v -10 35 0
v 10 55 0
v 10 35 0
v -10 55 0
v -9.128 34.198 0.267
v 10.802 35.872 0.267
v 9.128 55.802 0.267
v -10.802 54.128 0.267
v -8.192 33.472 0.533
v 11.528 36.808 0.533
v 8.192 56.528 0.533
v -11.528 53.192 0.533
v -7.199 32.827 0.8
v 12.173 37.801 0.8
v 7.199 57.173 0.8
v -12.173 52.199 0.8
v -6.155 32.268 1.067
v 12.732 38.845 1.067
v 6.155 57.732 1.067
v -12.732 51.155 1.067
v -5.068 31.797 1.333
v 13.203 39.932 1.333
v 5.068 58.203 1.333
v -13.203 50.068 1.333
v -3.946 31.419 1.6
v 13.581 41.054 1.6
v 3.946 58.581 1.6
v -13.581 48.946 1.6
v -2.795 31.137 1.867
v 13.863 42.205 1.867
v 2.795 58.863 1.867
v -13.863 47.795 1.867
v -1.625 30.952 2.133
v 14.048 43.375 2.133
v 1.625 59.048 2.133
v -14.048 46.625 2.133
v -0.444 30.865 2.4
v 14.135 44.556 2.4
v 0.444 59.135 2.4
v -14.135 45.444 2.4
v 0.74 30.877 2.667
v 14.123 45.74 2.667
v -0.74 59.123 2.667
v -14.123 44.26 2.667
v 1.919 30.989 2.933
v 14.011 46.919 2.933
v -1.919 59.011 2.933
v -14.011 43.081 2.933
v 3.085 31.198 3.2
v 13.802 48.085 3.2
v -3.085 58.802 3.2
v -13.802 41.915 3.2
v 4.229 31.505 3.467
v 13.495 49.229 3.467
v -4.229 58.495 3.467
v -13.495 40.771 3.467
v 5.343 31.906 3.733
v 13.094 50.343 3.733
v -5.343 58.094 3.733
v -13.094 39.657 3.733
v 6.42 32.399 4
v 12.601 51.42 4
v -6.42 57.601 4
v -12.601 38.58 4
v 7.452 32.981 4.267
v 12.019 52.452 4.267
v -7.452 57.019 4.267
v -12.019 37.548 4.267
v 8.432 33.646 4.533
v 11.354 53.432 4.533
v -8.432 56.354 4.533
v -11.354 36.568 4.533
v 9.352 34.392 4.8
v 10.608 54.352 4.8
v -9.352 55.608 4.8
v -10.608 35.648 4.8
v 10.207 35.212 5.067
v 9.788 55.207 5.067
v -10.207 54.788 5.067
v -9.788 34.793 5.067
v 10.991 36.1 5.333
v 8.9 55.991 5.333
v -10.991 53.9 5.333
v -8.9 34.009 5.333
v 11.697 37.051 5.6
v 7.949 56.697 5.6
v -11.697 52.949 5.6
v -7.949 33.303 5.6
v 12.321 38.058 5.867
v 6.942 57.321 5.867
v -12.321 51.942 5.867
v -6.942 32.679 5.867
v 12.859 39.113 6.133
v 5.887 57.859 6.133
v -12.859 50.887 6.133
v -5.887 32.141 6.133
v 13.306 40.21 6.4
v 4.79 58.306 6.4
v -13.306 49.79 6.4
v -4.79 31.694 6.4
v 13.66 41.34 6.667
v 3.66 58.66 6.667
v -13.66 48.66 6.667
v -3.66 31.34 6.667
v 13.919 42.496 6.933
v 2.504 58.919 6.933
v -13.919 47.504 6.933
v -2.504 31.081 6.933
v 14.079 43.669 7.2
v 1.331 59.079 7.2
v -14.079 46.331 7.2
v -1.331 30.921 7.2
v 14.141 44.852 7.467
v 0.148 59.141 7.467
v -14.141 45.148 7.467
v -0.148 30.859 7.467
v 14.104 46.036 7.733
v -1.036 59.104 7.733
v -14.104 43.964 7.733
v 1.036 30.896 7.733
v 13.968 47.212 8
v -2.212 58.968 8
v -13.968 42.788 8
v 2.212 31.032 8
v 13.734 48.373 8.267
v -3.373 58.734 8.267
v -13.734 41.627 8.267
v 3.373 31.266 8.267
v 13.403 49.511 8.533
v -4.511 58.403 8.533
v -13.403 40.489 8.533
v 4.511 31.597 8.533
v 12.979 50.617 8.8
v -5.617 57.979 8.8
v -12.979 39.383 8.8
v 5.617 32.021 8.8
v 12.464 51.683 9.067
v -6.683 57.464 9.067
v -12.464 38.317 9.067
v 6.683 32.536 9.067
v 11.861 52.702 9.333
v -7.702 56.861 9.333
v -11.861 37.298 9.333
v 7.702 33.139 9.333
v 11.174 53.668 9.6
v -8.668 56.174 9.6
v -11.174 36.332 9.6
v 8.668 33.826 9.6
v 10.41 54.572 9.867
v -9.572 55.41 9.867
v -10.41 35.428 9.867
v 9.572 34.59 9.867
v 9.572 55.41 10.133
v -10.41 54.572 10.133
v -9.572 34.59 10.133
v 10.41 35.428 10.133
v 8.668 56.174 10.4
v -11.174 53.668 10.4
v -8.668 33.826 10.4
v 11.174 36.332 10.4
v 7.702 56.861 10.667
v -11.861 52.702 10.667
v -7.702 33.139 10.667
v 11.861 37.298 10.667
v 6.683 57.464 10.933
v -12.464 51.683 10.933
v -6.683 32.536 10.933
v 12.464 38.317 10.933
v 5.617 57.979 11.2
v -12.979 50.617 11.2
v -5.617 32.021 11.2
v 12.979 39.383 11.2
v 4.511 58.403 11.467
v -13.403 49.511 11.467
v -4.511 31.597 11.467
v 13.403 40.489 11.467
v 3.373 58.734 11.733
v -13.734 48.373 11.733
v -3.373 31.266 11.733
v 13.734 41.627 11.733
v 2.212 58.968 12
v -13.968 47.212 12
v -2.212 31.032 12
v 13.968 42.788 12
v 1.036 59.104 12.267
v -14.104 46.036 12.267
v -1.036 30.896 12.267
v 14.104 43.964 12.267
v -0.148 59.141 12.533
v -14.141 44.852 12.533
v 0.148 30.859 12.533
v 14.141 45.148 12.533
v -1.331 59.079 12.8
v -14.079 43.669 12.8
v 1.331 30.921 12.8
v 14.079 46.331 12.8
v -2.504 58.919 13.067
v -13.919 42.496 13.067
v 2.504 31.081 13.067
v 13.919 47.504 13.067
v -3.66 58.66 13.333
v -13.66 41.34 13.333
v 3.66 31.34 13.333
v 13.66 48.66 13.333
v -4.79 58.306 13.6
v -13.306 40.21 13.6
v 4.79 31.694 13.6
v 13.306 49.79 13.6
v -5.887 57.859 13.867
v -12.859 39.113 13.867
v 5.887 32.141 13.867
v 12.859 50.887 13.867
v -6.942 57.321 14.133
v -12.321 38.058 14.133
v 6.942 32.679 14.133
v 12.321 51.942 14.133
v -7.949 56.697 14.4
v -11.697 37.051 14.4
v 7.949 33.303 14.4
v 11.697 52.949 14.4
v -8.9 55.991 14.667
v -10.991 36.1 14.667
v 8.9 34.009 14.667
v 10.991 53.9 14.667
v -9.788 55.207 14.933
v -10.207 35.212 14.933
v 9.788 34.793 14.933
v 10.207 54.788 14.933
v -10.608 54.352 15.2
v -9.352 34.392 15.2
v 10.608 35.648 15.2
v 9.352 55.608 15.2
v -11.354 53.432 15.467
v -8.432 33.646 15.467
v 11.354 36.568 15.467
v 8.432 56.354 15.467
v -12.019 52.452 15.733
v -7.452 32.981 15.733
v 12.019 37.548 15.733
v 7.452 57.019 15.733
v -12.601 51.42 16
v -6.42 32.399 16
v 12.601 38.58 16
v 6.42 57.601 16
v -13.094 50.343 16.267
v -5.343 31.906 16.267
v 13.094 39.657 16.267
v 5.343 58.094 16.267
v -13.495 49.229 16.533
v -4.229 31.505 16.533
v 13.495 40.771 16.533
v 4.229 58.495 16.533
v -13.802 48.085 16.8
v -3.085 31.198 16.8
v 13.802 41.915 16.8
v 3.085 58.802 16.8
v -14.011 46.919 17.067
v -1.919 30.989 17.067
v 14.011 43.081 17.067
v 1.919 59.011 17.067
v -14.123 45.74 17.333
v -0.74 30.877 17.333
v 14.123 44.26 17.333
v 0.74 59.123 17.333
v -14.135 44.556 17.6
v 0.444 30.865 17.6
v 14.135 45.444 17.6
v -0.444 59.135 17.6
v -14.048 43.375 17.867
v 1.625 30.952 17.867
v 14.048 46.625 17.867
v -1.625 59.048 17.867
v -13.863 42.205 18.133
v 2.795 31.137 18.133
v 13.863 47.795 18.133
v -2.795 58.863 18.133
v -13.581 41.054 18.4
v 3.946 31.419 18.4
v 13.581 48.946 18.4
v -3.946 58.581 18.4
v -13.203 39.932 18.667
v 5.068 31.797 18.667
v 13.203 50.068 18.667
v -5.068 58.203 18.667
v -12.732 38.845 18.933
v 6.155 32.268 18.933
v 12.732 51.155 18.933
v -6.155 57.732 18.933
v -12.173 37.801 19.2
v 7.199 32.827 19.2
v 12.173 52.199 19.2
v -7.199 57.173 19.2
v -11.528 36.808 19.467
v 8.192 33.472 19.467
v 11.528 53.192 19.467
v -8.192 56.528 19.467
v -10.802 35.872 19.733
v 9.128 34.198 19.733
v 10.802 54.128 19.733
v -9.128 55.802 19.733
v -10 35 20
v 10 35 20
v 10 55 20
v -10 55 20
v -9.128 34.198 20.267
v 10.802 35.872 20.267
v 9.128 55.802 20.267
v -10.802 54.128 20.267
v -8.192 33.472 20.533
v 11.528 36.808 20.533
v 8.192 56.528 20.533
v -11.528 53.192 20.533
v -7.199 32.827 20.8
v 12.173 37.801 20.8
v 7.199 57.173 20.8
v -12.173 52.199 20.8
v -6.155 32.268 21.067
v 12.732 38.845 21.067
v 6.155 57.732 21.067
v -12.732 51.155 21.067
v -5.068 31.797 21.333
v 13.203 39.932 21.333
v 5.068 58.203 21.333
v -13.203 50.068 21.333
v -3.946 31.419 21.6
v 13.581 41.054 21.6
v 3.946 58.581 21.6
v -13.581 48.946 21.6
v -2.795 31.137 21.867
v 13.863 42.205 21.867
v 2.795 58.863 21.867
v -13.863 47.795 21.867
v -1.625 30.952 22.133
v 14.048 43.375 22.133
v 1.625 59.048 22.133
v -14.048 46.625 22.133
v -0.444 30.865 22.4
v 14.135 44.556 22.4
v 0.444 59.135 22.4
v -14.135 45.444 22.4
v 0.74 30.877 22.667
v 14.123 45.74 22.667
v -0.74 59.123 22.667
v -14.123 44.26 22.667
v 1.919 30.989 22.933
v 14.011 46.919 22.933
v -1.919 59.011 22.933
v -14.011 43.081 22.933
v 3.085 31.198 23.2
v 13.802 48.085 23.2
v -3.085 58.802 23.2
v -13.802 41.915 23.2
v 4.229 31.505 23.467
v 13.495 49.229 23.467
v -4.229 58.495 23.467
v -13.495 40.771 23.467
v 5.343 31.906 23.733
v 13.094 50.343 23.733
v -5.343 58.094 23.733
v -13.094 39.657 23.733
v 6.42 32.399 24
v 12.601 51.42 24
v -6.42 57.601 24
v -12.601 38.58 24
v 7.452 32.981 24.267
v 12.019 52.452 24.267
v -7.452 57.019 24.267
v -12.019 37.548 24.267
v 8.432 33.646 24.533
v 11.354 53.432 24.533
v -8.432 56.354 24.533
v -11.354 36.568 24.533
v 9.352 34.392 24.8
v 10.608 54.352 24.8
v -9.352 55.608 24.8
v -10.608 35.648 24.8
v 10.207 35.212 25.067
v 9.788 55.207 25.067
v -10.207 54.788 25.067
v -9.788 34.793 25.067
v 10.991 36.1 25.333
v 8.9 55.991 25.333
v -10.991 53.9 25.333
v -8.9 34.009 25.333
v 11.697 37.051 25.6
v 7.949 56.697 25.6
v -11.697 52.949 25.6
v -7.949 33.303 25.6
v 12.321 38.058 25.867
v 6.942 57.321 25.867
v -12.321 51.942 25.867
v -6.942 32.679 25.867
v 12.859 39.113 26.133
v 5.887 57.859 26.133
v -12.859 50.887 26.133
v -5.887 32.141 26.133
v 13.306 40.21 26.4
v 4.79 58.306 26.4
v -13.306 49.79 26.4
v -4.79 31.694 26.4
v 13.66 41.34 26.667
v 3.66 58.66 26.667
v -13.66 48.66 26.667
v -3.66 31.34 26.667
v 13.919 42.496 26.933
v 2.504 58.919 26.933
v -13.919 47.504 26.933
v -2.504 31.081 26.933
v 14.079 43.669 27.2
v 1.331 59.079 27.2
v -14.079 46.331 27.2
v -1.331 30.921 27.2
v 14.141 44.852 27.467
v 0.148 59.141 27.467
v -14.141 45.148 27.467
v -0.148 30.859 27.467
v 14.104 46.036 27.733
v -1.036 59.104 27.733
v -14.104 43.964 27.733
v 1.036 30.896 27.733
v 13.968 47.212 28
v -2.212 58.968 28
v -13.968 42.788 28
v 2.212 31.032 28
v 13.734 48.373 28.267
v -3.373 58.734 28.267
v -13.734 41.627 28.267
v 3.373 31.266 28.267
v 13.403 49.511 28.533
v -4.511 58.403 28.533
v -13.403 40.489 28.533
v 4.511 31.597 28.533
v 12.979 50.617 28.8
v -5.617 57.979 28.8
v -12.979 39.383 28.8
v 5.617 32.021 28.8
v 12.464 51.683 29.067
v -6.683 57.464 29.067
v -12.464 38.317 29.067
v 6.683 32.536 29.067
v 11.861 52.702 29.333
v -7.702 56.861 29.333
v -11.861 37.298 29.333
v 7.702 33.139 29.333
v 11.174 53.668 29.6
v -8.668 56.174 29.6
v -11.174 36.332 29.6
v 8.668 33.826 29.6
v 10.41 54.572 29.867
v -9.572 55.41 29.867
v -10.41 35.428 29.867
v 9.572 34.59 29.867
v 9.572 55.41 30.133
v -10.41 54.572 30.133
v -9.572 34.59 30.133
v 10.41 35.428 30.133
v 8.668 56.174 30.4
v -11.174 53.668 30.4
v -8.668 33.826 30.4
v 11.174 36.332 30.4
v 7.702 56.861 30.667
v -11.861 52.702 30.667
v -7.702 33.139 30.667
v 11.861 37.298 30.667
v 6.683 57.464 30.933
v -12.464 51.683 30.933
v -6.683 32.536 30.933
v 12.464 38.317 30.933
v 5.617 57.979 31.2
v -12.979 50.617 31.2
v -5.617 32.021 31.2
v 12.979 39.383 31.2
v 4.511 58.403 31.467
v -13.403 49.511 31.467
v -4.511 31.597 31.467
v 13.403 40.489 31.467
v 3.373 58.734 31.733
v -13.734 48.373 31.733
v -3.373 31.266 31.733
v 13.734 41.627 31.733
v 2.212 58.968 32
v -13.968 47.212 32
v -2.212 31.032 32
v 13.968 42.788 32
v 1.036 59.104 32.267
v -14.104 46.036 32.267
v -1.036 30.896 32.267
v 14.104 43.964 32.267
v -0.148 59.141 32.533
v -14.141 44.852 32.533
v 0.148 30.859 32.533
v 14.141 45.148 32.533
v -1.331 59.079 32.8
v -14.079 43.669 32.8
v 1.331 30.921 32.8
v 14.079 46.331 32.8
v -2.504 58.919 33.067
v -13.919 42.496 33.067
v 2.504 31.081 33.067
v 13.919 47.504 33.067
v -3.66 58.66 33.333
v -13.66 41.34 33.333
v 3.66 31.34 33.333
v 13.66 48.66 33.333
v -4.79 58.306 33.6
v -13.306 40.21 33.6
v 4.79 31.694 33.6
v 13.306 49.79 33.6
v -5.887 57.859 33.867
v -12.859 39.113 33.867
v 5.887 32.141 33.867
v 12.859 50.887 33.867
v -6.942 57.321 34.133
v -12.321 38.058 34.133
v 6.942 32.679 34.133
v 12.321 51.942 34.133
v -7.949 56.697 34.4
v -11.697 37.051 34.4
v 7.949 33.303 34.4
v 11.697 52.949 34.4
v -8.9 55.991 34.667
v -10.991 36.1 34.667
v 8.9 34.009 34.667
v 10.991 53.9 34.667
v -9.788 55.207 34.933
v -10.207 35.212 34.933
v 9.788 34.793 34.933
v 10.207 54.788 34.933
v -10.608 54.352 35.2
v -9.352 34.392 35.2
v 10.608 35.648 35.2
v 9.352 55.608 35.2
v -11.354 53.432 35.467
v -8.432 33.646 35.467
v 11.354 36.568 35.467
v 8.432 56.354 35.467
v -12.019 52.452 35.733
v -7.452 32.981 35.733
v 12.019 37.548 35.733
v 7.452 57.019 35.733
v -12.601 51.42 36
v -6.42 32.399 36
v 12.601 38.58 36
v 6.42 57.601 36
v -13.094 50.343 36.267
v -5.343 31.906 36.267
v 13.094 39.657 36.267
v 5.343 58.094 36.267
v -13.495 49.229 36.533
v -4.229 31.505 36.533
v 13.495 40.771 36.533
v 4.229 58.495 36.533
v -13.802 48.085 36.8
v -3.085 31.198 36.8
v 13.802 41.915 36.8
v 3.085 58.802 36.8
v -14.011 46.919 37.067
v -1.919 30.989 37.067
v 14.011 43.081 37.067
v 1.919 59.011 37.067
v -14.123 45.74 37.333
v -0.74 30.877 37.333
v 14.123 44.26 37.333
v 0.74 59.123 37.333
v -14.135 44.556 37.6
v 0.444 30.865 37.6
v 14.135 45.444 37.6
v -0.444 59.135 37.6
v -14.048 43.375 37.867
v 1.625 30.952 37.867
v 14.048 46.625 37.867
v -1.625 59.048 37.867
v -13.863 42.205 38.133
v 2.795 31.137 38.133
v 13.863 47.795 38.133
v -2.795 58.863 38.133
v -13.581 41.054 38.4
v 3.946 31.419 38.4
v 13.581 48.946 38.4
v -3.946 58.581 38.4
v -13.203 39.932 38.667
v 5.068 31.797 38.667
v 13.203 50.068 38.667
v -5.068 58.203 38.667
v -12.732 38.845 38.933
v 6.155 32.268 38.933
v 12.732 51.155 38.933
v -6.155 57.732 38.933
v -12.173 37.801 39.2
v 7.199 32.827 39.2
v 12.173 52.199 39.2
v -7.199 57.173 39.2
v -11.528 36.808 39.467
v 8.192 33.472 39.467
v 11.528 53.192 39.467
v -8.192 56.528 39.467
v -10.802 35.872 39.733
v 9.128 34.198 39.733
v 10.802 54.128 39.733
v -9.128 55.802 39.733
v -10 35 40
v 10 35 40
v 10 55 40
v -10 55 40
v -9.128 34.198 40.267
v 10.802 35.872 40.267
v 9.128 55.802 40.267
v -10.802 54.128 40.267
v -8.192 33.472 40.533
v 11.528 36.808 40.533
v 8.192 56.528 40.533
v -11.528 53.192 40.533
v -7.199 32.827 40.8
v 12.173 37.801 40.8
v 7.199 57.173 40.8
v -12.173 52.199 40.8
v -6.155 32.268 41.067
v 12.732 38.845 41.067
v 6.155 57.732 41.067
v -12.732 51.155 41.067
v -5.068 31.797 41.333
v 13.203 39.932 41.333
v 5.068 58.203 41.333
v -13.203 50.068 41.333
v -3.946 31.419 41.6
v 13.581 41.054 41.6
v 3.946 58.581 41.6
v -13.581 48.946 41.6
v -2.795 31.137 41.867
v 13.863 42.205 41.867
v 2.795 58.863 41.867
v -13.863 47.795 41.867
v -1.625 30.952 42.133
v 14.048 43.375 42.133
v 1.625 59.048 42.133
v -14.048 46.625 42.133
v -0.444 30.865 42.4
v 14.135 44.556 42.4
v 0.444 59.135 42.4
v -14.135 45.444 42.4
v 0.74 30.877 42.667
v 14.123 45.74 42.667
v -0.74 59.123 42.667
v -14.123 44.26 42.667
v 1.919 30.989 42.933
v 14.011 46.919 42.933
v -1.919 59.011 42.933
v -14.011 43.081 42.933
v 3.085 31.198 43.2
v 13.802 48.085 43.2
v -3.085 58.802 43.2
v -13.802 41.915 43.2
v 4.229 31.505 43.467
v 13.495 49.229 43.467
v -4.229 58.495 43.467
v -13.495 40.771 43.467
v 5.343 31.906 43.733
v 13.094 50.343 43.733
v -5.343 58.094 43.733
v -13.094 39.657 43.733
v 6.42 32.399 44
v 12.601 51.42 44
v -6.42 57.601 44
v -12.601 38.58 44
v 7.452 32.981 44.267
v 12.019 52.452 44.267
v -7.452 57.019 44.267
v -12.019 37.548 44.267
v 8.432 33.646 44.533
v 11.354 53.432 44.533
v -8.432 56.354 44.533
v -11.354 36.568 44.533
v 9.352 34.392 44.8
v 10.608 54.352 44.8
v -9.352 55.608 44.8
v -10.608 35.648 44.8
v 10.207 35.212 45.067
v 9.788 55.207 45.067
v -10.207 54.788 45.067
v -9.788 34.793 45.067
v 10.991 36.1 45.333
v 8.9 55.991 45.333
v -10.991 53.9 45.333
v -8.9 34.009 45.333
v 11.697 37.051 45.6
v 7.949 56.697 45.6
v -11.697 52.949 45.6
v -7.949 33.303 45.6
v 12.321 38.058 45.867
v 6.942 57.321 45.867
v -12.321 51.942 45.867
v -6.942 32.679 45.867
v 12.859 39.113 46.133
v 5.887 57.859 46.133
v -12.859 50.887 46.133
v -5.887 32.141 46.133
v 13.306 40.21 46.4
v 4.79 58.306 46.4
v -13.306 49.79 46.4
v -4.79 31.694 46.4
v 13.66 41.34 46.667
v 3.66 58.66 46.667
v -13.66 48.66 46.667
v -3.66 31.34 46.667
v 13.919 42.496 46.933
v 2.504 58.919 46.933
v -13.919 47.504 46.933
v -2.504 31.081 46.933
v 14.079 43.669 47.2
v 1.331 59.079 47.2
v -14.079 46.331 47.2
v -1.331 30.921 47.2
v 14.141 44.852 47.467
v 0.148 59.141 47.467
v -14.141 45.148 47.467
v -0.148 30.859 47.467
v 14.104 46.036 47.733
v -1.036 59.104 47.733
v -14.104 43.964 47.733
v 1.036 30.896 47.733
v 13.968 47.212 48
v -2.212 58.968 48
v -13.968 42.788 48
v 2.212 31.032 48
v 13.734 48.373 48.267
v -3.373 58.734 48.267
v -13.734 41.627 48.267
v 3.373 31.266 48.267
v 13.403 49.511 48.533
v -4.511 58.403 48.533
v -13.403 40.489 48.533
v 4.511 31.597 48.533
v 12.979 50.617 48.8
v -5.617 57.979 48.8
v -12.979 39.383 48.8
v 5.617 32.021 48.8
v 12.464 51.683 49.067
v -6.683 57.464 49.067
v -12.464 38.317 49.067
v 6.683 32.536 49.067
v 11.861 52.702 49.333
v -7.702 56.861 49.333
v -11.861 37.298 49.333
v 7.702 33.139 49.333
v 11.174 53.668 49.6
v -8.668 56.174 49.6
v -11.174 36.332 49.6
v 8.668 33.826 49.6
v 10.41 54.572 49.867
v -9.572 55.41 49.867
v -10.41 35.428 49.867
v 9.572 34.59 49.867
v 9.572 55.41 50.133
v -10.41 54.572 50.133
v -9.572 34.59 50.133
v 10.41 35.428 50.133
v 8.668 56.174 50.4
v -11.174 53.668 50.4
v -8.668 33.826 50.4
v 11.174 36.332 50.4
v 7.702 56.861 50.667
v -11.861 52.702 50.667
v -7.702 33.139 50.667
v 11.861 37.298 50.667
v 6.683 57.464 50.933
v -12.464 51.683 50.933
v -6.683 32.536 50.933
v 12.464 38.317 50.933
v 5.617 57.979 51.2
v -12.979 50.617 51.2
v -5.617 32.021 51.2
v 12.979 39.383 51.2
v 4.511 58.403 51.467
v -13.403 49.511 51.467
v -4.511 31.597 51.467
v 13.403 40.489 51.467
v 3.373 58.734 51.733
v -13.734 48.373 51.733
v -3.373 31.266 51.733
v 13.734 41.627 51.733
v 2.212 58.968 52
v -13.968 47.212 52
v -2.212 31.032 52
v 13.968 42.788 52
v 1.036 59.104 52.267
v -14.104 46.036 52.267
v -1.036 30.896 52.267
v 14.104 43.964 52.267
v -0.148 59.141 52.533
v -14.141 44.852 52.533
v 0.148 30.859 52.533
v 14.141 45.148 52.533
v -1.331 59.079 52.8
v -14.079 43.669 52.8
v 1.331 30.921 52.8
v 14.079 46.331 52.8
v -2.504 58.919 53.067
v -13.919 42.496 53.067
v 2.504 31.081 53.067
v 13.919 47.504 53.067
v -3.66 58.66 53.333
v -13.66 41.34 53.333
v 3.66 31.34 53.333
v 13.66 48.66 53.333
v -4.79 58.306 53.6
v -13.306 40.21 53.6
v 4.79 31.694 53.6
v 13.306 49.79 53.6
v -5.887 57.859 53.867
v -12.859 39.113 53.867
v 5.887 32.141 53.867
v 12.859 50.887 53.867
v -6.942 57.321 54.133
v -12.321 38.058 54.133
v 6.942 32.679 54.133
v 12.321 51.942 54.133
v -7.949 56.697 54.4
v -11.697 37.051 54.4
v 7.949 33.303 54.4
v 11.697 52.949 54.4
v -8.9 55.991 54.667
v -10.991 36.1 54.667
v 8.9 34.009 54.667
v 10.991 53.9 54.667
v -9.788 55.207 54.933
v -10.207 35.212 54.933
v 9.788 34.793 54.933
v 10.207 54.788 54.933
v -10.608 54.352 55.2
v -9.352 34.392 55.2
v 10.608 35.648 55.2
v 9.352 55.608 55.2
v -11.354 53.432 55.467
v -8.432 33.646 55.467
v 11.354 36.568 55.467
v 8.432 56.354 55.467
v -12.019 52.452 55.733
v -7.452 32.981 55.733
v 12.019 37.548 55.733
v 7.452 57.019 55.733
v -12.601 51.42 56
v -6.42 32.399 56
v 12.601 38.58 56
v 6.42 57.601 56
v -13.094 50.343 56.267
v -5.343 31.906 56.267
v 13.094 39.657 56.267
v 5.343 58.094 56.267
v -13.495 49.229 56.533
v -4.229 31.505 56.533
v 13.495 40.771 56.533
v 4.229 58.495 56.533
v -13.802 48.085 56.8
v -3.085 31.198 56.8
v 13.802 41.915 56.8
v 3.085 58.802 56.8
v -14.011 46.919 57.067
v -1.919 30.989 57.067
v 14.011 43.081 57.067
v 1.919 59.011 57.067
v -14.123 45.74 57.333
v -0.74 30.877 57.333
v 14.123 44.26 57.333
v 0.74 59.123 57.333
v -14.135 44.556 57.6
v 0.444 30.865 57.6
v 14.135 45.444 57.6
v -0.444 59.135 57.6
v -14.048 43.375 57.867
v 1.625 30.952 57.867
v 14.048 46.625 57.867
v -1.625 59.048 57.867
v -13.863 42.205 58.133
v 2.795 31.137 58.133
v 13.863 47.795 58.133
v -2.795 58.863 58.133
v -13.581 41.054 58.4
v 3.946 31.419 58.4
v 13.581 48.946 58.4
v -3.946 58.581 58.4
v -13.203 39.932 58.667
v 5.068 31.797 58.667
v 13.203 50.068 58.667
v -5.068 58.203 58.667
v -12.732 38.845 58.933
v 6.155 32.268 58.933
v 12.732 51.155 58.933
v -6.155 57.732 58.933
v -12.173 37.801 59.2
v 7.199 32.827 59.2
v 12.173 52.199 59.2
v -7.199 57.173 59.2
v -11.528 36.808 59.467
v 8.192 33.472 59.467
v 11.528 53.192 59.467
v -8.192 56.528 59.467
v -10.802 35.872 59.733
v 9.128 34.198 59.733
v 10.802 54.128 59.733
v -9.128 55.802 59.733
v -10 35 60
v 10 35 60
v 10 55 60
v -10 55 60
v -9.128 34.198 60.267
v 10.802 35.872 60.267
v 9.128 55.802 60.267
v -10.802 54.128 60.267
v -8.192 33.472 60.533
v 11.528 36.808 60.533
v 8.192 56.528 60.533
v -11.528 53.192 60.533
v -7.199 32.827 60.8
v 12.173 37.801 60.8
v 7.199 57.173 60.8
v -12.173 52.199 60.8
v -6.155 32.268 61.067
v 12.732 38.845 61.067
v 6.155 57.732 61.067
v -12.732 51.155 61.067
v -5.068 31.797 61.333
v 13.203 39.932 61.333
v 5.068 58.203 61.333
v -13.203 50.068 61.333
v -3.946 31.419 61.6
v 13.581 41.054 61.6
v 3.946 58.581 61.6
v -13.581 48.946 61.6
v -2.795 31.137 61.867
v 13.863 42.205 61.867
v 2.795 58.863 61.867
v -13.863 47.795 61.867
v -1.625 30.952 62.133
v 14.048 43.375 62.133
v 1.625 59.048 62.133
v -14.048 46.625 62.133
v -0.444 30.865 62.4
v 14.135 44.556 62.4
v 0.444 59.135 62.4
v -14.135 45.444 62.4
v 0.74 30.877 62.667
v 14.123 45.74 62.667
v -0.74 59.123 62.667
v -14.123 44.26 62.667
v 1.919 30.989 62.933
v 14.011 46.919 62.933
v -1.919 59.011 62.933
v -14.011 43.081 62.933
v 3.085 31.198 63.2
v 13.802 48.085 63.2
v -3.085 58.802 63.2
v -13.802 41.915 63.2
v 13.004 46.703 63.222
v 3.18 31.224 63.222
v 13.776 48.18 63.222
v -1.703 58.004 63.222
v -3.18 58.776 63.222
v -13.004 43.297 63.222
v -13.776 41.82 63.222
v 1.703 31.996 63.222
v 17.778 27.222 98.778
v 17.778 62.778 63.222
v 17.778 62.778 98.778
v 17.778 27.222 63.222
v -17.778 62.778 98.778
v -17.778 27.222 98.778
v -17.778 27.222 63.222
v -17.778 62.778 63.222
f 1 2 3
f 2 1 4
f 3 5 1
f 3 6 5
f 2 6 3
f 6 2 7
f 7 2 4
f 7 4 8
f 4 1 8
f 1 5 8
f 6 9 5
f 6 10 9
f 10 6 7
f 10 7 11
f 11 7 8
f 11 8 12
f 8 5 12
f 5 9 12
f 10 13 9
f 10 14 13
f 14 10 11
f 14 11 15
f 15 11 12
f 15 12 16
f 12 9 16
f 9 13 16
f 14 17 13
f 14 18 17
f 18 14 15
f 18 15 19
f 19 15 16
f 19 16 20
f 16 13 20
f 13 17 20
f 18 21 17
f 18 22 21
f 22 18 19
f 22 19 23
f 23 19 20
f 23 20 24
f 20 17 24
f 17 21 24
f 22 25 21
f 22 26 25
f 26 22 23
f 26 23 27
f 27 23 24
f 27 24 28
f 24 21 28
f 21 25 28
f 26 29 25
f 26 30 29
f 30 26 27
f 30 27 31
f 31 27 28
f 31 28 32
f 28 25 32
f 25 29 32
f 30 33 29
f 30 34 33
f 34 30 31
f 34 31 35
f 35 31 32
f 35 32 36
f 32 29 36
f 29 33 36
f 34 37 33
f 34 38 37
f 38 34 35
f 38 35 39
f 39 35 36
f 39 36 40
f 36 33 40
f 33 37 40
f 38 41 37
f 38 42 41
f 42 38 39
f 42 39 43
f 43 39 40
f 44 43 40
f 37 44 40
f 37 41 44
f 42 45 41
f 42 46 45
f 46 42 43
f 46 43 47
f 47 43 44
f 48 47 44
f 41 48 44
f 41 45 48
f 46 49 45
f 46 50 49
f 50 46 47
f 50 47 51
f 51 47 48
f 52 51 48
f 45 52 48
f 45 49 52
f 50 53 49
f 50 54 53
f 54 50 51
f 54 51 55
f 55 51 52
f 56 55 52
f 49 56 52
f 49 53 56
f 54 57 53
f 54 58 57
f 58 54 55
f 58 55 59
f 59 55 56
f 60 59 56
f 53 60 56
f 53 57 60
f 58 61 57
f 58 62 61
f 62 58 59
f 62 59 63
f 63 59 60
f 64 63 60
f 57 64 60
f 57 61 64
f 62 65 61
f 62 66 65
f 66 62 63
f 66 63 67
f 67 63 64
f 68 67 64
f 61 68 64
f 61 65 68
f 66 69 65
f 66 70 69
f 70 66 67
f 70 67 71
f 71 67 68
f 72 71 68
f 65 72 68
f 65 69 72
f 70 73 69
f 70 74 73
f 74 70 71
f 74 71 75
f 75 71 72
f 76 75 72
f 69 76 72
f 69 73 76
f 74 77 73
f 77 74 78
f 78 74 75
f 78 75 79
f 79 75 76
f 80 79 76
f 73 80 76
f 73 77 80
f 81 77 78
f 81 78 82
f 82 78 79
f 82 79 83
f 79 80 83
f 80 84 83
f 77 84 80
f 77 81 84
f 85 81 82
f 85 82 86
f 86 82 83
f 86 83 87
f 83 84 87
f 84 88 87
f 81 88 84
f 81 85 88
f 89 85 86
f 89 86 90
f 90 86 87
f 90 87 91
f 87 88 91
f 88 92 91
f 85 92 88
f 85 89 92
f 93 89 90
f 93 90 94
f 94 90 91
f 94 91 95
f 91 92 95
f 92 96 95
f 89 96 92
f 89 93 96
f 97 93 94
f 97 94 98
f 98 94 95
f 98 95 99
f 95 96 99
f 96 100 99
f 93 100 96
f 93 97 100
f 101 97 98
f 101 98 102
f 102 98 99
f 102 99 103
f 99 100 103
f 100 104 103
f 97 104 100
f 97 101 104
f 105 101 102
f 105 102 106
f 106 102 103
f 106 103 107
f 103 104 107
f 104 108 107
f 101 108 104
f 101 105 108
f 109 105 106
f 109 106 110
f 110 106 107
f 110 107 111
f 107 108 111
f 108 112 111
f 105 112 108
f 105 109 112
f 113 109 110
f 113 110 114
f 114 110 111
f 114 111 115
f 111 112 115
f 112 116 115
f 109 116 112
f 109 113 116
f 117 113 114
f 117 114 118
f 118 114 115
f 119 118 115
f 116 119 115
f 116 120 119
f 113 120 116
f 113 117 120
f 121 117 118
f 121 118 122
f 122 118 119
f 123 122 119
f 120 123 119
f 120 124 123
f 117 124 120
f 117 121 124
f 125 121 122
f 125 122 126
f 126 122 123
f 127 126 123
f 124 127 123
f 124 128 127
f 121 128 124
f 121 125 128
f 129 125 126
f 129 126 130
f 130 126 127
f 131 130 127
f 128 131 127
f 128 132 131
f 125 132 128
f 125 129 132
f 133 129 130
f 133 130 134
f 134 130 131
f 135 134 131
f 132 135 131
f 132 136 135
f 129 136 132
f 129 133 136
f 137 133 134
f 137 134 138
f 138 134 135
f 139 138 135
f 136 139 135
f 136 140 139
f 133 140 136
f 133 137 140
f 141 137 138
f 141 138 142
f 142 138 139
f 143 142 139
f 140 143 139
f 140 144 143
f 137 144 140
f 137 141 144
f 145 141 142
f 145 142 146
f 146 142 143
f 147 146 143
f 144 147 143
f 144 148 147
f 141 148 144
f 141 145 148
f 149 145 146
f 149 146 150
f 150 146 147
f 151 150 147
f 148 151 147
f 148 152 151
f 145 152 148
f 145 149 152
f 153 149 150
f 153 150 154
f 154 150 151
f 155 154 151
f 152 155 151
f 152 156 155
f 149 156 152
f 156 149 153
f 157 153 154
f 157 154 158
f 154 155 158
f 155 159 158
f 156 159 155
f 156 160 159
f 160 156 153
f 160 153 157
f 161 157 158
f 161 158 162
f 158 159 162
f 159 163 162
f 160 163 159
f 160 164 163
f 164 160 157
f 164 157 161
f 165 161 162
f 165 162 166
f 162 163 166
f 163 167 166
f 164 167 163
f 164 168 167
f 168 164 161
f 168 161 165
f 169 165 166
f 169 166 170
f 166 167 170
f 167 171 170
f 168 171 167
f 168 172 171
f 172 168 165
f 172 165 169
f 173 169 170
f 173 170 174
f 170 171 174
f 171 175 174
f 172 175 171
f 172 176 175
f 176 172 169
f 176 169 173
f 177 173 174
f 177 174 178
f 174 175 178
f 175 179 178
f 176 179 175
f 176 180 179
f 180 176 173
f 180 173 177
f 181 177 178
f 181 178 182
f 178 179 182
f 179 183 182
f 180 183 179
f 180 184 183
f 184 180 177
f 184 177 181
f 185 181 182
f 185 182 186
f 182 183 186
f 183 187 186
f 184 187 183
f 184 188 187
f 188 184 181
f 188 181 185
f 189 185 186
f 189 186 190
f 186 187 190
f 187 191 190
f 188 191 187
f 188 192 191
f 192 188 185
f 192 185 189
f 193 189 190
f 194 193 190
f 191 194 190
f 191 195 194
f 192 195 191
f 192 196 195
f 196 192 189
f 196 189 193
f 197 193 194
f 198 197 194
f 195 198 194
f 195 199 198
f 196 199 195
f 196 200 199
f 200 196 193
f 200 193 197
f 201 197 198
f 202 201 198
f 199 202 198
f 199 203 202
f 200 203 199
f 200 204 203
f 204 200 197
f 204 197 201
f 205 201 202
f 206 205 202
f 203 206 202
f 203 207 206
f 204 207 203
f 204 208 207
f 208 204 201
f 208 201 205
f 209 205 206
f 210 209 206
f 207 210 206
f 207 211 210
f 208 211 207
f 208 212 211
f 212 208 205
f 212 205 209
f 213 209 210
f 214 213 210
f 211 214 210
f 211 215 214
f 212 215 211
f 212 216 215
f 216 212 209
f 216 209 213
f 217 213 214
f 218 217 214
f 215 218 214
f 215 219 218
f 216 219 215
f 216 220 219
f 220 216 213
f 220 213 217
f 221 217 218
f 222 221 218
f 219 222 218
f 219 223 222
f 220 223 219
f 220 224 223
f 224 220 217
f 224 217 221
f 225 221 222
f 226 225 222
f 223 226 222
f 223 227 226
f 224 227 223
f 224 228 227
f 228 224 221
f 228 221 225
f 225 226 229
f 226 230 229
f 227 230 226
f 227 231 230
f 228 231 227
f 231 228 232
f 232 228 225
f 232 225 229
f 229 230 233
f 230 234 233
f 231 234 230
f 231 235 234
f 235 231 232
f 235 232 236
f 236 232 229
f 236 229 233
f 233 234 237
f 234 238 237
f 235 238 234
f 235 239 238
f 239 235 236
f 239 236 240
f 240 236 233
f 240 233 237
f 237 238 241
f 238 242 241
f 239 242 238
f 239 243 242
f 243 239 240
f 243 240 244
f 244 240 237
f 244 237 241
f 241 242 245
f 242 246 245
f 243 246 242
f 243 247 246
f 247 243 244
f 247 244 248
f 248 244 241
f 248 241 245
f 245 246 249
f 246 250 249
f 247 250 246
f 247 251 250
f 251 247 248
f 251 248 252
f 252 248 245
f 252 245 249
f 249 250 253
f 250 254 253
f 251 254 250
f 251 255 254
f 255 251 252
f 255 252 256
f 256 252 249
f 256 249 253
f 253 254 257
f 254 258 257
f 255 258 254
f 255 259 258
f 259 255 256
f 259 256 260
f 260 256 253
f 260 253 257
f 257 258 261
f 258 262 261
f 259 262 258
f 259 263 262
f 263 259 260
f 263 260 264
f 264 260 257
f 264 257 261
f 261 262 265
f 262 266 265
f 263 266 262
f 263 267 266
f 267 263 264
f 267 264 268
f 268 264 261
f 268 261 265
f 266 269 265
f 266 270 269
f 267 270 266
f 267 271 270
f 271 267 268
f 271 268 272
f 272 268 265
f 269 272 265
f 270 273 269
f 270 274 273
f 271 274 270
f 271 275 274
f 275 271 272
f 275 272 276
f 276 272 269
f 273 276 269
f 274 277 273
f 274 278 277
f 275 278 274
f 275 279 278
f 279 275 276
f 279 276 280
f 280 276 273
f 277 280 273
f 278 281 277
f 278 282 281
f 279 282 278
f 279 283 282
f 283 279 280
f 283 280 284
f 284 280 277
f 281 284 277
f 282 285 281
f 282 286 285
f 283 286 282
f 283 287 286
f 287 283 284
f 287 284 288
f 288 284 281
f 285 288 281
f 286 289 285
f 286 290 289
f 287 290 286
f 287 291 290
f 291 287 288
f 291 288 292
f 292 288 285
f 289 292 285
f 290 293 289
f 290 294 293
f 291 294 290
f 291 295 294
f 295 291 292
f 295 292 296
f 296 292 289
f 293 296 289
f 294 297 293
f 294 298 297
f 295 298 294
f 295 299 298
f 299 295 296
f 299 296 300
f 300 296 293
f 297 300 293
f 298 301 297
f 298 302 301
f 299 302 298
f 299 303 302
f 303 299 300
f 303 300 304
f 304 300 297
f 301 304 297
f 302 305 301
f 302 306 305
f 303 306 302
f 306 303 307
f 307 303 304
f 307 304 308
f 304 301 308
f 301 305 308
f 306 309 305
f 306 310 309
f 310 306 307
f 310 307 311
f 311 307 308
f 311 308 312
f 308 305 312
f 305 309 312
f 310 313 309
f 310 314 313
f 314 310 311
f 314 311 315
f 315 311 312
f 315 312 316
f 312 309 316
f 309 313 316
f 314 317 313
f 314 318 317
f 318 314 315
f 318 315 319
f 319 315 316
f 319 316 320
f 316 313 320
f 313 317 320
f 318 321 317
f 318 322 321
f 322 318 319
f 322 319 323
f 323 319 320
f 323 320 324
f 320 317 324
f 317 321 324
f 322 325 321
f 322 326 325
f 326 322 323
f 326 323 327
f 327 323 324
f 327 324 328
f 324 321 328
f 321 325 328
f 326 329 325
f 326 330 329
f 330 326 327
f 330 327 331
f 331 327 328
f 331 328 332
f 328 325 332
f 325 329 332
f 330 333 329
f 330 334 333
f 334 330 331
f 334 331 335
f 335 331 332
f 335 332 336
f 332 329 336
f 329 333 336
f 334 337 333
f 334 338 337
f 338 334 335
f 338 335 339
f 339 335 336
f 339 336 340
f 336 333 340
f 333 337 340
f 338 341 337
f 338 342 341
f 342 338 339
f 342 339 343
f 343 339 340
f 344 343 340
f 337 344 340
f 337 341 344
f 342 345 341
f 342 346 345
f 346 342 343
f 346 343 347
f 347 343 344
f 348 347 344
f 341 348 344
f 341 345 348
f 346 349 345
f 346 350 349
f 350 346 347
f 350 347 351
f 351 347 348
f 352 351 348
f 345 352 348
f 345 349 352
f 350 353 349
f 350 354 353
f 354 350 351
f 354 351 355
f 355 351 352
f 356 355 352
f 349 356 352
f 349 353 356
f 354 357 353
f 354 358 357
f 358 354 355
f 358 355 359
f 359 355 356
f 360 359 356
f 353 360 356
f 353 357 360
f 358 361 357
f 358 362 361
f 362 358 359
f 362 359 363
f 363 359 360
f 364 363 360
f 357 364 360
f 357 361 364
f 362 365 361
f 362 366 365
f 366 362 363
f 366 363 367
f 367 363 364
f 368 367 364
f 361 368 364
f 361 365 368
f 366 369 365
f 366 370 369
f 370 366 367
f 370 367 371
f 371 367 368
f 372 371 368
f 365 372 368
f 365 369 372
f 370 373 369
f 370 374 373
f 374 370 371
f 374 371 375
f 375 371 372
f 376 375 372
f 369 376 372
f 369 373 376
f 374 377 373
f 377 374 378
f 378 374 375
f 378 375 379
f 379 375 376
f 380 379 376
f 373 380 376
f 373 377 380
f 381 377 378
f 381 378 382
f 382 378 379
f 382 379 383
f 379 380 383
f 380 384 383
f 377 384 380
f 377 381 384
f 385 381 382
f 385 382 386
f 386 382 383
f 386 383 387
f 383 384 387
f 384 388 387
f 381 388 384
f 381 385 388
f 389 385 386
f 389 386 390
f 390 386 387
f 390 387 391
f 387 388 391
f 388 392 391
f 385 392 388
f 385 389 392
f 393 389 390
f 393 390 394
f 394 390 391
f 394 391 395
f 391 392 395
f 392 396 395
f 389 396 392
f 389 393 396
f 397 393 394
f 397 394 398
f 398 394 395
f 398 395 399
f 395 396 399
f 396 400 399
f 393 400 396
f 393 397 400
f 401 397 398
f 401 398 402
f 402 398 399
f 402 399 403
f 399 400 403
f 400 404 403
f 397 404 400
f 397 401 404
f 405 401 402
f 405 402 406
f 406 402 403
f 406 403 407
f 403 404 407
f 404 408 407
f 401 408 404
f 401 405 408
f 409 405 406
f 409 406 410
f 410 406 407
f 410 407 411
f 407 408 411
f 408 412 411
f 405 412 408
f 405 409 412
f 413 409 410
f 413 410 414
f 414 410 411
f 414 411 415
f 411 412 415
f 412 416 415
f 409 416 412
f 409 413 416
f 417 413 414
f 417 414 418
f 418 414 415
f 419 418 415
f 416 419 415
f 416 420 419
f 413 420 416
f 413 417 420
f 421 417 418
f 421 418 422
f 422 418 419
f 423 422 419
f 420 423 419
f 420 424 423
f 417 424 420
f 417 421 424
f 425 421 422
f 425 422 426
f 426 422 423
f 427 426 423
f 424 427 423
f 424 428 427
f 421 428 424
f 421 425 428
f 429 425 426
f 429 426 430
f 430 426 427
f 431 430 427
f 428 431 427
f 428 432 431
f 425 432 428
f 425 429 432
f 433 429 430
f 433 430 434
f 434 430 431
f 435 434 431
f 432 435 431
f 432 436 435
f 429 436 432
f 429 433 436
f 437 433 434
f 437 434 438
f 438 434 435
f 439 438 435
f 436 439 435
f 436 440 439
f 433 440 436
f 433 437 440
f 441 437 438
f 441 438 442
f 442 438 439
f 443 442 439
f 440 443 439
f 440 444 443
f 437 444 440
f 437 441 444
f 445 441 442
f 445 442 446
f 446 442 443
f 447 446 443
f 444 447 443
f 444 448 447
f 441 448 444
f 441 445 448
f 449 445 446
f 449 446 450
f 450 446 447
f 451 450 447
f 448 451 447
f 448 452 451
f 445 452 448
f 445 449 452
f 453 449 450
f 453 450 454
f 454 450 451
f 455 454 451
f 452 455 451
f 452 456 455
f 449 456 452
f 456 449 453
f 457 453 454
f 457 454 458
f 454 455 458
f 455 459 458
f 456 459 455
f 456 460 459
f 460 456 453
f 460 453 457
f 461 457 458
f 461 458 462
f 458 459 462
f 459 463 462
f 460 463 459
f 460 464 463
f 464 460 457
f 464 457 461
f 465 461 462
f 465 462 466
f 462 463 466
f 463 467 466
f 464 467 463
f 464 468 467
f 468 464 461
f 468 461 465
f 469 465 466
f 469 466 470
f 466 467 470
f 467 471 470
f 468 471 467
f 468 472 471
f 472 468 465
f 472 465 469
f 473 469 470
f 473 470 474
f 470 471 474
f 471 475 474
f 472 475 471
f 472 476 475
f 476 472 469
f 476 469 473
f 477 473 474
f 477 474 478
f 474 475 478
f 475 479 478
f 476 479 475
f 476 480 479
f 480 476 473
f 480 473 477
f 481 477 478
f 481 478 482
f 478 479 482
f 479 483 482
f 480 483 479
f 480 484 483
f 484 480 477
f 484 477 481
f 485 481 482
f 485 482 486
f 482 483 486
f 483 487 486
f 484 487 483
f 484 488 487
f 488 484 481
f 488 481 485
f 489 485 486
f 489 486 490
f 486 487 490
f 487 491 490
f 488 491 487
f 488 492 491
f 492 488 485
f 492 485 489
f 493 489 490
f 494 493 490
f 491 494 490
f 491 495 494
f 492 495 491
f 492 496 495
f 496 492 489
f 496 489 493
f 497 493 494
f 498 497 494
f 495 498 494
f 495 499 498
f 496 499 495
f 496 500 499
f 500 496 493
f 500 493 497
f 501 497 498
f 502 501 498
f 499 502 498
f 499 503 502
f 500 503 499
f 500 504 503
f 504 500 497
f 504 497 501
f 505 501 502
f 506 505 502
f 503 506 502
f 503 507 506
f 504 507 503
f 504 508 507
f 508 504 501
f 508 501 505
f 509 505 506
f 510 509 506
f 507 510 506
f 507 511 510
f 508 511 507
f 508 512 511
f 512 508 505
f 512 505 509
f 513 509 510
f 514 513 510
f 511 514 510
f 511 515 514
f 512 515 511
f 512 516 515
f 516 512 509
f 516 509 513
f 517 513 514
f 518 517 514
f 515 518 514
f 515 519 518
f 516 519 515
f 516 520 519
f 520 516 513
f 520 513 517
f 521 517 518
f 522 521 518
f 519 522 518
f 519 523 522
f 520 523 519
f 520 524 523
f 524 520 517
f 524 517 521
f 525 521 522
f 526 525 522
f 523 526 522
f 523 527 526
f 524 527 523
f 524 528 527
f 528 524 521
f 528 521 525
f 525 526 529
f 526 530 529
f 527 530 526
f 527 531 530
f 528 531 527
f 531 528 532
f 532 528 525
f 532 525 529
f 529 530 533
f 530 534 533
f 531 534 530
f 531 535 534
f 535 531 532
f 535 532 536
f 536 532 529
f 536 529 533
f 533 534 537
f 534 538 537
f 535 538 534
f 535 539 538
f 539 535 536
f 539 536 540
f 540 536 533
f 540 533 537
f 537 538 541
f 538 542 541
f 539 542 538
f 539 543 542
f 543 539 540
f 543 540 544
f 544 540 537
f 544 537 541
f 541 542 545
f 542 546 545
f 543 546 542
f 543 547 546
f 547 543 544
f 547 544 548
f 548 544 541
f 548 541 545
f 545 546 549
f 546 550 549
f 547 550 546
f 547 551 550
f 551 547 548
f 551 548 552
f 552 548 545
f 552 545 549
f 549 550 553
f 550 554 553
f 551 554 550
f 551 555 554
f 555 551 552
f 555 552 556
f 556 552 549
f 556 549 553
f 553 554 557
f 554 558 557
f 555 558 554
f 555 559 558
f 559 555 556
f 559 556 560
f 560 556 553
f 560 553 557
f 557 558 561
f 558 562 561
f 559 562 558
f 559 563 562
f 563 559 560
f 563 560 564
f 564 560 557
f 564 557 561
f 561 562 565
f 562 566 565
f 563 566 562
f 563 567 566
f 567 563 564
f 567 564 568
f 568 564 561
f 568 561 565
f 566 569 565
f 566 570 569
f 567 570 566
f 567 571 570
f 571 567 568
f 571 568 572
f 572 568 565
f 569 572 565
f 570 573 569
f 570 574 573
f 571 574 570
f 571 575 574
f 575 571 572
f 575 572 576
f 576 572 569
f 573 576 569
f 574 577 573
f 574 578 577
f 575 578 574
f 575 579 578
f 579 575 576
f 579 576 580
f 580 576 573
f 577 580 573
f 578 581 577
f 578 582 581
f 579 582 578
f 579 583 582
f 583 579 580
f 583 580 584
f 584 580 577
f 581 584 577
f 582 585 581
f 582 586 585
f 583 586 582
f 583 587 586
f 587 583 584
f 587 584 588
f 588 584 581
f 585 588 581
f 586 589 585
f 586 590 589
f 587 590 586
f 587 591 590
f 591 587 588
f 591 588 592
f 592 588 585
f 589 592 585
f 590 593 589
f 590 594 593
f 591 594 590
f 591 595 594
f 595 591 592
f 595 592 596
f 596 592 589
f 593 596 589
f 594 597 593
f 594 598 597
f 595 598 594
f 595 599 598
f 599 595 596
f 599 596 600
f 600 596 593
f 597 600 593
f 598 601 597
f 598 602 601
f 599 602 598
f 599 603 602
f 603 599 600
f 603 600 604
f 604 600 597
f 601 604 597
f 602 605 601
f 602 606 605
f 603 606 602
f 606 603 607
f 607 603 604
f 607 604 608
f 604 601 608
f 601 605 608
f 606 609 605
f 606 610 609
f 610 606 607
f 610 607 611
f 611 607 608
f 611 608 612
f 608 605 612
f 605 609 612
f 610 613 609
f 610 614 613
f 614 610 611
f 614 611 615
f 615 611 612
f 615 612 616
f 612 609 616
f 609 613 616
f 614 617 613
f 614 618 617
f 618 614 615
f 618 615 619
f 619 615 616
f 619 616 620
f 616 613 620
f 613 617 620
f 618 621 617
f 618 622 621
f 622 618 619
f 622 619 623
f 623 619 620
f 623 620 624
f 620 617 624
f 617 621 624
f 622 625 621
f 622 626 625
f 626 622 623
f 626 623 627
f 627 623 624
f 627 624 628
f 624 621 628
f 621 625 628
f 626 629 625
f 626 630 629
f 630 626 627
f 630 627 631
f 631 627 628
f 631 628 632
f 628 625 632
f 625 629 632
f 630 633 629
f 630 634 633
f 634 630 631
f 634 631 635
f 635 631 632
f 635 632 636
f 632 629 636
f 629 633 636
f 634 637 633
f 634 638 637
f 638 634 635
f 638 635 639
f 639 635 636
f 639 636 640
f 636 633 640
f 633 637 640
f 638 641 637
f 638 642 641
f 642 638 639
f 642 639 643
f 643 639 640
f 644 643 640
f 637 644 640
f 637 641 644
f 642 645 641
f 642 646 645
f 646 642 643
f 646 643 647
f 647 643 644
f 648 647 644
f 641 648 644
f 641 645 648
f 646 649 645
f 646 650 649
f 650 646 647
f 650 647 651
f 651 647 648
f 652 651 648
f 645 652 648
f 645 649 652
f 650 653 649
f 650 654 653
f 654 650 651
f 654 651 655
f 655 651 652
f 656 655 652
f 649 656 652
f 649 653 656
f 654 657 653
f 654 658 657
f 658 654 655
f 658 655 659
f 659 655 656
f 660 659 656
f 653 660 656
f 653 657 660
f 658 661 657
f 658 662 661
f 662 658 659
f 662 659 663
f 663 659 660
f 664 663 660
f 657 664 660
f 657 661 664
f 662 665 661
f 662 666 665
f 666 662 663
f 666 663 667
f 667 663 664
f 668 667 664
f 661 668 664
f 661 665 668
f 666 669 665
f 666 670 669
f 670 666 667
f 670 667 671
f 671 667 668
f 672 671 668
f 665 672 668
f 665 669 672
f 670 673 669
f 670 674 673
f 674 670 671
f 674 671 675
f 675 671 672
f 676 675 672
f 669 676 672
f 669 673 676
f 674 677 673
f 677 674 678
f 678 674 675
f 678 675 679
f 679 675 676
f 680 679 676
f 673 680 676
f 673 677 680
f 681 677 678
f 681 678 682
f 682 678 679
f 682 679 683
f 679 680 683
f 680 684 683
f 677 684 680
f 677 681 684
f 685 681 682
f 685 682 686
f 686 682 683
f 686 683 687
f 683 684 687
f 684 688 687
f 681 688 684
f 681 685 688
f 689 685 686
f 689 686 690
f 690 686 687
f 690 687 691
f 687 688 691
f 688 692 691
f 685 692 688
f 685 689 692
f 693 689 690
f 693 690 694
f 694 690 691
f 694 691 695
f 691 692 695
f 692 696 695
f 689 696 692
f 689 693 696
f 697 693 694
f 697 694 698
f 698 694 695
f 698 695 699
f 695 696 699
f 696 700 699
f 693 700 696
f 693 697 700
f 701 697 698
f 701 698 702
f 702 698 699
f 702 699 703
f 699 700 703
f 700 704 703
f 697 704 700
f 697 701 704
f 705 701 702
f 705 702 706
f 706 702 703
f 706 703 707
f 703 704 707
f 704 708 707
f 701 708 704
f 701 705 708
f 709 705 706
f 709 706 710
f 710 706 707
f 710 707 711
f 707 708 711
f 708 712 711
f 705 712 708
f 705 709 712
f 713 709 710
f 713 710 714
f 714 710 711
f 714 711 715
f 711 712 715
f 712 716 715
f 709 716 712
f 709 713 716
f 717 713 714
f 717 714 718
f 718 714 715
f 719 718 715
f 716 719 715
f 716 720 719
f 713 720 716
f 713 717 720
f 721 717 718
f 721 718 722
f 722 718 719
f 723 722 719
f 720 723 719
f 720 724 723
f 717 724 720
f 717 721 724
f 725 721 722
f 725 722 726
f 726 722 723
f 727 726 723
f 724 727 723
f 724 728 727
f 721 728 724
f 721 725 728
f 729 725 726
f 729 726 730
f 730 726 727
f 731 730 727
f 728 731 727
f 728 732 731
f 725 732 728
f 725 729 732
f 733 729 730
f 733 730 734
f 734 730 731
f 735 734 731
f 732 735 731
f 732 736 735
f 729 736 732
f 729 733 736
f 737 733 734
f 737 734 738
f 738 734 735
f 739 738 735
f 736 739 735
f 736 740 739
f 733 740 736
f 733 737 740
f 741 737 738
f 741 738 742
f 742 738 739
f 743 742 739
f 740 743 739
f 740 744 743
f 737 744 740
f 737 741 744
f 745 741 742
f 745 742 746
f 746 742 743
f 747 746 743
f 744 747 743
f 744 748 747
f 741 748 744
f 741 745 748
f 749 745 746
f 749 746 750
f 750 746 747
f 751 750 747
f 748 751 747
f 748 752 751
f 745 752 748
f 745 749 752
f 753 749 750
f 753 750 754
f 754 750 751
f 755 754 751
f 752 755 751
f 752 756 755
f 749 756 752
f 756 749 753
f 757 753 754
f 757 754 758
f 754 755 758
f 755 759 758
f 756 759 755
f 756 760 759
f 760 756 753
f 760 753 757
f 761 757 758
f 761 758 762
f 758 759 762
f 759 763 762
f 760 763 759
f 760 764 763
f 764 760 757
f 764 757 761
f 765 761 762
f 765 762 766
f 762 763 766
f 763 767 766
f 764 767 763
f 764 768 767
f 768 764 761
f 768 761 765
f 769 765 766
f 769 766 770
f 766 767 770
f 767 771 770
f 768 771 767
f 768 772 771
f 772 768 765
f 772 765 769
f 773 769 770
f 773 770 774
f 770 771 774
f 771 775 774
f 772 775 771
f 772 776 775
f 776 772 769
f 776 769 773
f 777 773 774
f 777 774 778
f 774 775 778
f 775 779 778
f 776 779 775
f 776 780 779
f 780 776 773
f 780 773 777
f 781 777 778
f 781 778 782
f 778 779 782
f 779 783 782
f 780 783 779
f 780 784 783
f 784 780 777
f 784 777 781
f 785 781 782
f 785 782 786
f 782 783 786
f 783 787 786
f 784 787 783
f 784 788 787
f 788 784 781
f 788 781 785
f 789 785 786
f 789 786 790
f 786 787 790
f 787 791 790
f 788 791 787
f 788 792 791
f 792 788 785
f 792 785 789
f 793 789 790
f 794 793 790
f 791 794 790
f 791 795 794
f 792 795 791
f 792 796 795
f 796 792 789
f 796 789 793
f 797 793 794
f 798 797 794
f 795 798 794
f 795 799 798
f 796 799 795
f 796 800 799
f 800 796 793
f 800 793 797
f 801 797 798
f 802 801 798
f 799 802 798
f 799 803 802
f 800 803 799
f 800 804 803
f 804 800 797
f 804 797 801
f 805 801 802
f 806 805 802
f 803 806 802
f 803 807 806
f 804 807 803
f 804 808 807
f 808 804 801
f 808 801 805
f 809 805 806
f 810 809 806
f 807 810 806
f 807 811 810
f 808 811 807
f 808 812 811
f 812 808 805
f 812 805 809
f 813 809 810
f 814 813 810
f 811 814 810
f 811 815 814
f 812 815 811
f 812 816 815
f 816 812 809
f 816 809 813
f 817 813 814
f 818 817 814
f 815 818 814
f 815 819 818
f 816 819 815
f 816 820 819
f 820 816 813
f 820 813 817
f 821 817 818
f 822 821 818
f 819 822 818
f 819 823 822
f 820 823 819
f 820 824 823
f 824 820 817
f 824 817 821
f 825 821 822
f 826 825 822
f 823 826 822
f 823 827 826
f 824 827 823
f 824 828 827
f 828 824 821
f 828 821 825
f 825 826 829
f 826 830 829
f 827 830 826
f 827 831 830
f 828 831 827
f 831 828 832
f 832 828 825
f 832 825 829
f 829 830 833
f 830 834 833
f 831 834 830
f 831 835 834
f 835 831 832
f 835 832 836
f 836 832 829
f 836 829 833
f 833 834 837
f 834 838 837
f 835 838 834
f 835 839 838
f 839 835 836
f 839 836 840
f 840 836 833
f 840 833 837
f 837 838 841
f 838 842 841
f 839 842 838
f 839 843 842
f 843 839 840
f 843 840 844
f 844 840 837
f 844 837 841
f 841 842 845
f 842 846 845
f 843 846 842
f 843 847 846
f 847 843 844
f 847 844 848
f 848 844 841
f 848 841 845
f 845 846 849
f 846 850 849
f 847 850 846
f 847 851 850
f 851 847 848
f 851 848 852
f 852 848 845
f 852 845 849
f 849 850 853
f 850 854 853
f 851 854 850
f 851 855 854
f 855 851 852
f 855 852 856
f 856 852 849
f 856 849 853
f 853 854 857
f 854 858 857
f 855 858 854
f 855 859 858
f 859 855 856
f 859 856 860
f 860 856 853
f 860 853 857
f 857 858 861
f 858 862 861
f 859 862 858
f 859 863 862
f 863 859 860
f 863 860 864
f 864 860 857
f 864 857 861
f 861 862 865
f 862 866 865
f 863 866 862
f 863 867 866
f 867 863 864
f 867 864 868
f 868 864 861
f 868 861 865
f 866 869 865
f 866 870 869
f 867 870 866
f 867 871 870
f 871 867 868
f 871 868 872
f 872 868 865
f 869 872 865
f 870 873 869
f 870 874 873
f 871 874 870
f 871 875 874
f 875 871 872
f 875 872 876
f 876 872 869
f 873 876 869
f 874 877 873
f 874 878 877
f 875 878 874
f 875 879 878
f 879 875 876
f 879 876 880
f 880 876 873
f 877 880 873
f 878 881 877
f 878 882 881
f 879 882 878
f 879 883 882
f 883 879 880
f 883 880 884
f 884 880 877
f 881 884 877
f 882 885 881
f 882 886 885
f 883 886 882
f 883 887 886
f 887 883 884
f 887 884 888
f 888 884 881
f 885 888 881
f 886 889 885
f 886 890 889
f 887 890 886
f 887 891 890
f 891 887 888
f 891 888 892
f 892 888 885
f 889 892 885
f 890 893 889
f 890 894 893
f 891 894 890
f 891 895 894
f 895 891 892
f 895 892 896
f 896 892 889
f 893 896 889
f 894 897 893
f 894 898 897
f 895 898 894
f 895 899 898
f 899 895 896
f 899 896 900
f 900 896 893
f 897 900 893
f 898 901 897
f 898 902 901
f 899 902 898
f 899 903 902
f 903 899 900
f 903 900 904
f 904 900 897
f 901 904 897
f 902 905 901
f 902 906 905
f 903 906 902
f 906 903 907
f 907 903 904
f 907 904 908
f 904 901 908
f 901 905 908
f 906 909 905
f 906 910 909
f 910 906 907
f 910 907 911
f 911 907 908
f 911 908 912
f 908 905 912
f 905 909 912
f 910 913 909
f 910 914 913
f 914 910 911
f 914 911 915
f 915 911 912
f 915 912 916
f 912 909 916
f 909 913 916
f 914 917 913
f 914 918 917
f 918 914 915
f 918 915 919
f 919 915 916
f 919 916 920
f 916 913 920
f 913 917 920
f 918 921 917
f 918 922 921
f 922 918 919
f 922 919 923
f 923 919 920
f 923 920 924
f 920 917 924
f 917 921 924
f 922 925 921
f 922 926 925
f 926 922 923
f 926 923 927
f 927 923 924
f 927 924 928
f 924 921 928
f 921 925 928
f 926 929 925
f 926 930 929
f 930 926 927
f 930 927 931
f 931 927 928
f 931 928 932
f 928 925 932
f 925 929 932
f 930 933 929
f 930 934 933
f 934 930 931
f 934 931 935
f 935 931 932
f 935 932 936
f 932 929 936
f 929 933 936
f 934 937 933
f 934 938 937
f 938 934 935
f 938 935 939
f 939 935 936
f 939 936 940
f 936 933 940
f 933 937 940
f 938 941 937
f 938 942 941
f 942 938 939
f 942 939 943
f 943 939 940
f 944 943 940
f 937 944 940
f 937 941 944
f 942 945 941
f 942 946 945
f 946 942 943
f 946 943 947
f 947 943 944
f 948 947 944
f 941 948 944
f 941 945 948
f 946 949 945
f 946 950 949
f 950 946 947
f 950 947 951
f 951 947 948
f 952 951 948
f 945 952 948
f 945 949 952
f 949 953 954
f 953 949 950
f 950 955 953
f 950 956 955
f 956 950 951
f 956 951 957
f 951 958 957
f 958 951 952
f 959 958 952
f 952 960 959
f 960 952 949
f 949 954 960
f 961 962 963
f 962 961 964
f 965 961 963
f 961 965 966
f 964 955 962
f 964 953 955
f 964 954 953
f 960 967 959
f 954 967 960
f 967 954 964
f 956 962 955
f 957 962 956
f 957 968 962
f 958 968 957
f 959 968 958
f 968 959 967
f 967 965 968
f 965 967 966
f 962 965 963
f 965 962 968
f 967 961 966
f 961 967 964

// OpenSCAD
altura = 80;
rotacionar = 1440; 

translate([0, 45, altura/2])
 linear_extrude(
   height = altura,
   twist = -rotacionar,
   scale = 1,
   center = true,
   slices = 300)
 square([altura/4, altura/4], center = true);
translate([0, 45, altura+1]) 
 cube( size = altura / 2.25, center = true);
